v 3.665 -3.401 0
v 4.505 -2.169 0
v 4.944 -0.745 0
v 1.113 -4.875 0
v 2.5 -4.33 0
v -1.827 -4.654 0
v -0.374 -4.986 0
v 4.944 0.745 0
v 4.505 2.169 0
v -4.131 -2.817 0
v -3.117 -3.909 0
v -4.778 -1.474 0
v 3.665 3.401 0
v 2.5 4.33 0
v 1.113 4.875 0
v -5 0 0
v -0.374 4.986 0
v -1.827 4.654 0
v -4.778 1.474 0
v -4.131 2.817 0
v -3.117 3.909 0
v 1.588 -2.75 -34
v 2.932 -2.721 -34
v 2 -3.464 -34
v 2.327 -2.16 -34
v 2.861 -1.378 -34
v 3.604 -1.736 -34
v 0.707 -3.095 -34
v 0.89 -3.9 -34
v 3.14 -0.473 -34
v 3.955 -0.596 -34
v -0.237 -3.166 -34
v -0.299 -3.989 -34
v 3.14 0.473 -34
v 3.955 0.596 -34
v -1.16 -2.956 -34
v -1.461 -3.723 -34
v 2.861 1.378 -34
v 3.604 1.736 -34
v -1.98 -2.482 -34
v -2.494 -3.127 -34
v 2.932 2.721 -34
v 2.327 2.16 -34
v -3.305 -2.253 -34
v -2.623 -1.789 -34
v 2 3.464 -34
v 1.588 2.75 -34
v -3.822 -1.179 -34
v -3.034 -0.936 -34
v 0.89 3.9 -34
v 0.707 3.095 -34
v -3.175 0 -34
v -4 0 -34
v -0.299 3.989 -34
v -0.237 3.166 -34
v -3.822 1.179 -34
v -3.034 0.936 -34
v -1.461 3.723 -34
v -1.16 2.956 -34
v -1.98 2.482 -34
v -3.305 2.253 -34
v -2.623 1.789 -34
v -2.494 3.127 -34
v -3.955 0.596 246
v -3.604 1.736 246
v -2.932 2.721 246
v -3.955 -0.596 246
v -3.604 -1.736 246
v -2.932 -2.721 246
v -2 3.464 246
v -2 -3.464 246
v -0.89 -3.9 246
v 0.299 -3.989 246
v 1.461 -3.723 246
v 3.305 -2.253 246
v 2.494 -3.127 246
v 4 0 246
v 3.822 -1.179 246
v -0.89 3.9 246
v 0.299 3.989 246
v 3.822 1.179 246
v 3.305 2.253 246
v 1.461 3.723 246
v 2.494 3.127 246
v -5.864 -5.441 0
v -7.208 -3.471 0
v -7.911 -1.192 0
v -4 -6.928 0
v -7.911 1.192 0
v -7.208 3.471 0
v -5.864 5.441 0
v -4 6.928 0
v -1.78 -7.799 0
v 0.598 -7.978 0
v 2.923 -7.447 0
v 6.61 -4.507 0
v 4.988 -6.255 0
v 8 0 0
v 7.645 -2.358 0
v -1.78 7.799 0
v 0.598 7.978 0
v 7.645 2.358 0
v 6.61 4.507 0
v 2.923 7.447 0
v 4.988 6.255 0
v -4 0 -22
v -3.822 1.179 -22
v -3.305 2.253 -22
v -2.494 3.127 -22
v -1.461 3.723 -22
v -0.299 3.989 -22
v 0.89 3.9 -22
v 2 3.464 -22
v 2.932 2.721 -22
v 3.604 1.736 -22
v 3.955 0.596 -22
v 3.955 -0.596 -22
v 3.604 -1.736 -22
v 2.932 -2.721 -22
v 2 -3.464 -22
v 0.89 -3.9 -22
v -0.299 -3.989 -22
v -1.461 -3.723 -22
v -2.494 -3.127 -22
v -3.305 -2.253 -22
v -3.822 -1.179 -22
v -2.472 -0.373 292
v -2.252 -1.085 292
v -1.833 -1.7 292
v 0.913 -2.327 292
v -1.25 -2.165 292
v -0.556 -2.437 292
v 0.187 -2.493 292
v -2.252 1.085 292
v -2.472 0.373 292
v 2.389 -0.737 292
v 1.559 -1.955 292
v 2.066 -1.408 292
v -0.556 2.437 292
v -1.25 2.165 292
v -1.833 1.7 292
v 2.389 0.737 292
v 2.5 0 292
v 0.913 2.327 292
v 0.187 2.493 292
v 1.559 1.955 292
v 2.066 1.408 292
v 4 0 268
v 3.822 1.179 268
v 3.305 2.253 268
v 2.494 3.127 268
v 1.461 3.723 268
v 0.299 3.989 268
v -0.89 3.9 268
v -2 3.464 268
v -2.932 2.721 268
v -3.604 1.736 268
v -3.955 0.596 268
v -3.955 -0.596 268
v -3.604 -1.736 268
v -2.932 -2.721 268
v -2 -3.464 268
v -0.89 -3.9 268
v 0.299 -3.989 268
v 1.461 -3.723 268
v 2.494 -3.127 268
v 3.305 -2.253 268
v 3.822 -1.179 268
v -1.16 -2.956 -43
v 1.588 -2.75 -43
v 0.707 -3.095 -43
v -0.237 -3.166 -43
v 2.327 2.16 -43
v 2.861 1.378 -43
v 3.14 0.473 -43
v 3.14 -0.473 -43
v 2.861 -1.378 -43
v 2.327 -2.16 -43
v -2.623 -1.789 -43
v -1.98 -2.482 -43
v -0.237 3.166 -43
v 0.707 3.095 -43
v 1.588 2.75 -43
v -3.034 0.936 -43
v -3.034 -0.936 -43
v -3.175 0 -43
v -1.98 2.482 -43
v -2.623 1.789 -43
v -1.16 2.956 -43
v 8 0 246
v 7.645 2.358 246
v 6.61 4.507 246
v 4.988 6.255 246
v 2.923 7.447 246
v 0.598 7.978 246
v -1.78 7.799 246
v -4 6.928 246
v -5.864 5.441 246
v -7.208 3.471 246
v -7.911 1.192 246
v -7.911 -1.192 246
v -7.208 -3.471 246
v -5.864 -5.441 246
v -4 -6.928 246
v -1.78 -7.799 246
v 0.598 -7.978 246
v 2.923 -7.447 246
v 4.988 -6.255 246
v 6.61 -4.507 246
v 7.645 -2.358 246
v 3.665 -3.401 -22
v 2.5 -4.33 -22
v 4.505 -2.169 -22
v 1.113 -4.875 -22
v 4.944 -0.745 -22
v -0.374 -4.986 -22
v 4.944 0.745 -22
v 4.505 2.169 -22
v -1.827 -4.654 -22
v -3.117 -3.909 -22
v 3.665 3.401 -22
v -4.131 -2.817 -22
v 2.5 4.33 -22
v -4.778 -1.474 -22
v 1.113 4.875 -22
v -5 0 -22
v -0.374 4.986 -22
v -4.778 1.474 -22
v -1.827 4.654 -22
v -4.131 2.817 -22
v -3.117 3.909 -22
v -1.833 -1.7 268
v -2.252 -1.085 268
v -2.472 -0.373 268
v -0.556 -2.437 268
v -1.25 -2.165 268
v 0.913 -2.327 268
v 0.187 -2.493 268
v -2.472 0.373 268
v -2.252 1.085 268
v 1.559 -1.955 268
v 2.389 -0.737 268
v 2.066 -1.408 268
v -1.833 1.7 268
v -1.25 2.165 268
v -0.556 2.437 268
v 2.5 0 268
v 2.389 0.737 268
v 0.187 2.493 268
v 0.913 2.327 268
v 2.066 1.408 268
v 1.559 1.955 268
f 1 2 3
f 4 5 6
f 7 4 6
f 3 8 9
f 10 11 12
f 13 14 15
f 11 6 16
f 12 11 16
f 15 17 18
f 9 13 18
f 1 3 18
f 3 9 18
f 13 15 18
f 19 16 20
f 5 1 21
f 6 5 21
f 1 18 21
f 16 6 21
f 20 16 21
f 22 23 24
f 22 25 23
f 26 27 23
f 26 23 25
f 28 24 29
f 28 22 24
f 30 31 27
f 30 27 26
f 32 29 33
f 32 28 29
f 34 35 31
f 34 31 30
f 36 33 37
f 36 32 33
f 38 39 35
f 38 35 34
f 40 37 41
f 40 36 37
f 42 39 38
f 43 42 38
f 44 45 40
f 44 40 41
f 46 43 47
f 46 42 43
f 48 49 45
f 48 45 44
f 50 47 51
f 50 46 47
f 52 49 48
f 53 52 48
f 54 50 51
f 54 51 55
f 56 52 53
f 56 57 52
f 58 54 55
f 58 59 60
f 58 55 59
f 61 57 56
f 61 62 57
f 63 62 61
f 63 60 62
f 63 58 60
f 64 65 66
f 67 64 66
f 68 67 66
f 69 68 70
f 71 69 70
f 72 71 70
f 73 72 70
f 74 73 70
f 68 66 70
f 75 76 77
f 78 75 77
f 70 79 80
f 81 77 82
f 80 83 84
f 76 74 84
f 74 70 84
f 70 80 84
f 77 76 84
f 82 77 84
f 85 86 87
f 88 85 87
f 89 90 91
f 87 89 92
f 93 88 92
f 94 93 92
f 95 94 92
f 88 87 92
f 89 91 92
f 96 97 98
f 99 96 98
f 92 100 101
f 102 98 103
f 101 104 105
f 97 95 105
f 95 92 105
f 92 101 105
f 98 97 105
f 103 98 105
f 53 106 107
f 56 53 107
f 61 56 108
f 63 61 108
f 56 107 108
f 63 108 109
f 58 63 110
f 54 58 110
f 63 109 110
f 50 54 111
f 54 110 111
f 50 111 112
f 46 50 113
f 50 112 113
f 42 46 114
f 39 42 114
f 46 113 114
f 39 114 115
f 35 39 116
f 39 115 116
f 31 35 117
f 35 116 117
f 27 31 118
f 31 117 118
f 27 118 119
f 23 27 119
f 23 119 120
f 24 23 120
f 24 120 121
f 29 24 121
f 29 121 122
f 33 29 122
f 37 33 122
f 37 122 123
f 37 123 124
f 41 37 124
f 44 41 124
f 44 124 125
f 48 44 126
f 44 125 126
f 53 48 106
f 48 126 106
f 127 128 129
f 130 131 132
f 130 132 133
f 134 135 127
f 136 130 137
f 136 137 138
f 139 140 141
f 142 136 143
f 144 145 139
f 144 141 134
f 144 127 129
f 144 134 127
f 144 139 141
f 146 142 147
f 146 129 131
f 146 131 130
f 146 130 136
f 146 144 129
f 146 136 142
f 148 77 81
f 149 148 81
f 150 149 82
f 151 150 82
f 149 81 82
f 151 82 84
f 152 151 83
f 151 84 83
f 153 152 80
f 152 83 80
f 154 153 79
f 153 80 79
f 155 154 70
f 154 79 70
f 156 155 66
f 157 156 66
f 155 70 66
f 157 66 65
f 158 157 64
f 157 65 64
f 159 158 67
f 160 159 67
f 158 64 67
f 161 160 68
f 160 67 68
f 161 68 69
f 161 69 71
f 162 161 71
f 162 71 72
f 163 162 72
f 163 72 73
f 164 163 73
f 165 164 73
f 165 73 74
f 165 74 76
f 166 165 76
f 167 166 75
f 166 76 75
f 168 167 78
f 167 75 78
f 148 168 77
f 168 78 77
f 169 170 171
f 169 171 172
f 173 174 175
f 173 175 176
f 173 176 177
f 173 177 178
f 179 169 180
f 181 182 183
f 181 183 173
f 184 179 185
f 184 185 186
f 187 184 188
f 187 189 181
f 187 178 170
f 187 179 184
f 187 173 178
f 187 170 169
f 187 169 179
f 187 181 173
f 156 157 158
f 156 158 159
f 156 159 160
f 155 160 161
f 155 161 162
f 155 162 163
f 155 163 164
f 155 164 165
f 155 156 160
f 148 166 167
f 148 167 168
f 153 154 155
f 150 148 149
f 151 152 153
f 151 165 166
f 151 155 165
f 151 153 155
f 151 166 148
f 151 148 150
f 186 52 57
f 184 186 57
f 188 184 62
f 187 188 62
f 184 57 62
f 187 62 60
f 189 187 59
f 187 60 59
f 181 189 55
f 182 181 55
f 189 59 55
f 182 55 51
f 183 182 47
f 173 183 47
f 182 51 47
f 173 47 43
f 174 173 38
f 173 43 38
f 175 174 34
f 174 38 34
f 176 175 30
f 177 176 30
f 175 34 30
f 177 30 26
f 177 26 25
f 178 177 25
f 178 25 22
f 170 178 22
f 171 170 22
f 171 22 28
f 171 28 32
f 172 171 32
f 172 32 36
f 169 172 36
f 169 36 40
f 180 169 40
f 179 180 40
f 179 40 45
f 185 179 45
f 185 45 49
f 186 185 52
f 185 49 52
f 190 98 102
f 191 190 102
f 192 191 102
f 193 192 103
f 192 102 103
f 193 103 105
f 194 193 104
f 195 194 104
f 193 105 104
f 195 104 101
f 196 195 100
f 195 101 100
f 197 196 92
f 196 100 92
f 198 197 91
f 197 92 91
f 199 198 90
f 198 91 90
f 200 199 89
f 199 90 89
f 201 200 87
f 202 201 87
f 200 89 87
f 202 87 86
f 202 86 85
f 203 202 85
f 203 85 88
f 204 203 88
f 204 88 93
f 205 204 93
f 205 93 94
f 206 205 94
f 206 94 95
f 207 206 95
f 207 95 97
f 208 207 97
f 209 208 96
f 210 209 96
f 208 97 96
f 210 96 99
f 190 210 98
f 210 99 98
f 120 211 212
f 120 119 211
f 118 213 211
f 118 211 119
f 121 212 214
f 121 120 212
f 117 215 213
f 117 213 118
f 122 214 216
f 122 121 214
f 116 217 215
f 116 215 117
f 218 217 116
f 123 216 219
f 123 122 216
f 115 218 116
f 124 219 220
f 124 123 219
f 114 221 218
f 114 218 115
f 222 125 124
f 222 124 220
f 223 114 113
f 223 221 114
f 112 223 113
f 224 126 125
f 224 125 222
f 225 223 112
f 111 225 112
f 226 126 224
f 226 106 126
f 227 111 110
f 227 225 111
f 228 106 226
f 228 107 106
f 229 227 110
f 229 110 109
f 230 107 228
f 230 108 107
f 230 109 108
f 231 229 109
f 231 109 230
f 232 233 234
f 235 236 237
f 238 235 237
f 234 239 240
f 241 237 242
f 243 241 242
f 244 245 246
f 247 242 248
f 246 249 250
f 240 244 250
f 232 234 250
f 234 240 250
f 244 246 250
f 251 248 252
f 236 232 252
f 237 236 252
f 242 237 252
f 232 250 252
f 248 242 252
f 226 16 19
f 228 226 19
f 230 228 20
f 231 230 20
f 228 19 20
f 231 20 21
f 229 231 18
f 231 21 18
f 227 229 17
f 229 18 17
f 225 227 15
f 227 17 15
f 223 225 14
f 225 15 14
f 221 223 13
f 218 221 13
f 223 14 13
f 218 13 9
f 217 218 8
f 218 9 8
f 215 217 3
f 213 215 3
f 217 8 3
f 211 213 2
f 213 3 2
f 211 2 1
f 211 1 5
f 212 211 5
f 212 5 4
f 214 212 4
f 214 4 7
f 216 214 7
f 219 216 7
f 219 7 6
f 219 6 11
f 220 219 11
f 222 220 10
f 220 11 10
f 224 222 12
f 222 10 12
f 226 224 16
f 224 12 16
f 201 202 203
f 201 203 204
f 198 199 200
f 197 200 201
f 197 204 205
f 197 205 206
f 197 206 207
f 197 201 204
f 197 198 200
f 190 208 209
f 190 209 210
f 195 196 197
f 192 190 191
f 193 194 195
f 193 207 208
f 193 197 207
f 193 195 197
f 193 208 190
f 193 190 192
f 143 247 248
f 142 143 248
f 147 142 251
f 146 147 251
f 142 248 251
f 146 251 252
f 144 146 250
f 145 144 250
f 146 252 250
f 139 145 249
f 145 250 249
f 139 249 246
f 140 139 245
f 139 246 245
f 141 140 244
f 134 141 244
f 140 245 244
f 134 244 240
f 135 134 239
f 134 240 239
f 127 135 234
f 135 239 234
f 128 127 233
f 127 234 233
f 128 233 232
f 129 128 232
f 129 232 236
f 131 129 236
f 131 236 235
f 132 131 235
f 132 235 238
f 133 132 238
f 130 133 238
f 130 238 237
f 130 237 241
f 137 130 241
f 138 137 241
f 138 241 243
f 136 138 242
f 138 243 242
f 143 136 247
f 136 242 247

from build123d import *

# Parameters (mm, degrees)
SKETCH_1_R      = 8
EXTRUDE_1_DEPTH = 246
SKETCH_2_R      = 4
EXTRUDE_2_DEPTH = 22
SKETCH_4_R      = 5
EXTRUDE_3_DEPTH = 22
SKETCH_5_R      = 2.5
EXTRUDE_4_DEPTH = 24
SKETCH_9_R      = 4
EXTRUDE_5_DEPTH = 12
SKETCH_10_R     = 3.175
EXTRUDE_6_DEPTH = 9


with BuildPart() as part:
    # 草图1 → 凸台-拉伸1 (new body)
    with BuildSketch(Plane.XY):
        Circle(SKETCH_1_R)
    extrude(amount=EXTRUDE_1_DEPTH)


with BuildPart() as body_2:
    # 草图2 → 凸台-拉伸2 (new body)
    with BuildSketch(Plane.XY.offset(246)):
        Circle(SKETCH_2_R)
    extrude(amount=EXTRUDE_2_DEPTH)


with BuildPart() as body_3:
    # 草图4 → 凸台-拉伸3 (new body)
    with BuildSketch(Plane(origin=(0, 0, 0), x_dir=(-1, 0, 0), z_dir=(0, 0, -1))):
        Circle(SKETCH_4_R)
    extrude(amount=EXTRUDE_3_DEPTH)

    # 草图9 → 凸台-拉伸5 (add)
    with BuildSketch(Plane(origin=(0, 0, -22), x_dir=(-1, 0, 0), z_dir=(0, 0, -1))):
        Circle(SKETCH_9_R)
    extrude(amount=EXTRUDE_5_DEPTH)

    # 草图10 → 凸台-拉伸6 (add)
    with BuildSketch(Plane(origin=(0, 0, -34), x_dir=(-1, 0, 0), z_dir=(0, 0, -1))):
        Circle(SKETCH_10_R)
    extrude(amount=EXTRUDE_6_DEPTH)


with BuildPart() as body_4:
    # 草图5 → 凸台-拉伸4 (new body)
    with BuildSketch(Plane.XY.offset(268)):
        Circle(SKETCH_5_R)
    extrude(amount=EXTRUDE_4_DEPTH)


solid = Compound([part.part, body_2.part, body_3.part, body_4.part])
